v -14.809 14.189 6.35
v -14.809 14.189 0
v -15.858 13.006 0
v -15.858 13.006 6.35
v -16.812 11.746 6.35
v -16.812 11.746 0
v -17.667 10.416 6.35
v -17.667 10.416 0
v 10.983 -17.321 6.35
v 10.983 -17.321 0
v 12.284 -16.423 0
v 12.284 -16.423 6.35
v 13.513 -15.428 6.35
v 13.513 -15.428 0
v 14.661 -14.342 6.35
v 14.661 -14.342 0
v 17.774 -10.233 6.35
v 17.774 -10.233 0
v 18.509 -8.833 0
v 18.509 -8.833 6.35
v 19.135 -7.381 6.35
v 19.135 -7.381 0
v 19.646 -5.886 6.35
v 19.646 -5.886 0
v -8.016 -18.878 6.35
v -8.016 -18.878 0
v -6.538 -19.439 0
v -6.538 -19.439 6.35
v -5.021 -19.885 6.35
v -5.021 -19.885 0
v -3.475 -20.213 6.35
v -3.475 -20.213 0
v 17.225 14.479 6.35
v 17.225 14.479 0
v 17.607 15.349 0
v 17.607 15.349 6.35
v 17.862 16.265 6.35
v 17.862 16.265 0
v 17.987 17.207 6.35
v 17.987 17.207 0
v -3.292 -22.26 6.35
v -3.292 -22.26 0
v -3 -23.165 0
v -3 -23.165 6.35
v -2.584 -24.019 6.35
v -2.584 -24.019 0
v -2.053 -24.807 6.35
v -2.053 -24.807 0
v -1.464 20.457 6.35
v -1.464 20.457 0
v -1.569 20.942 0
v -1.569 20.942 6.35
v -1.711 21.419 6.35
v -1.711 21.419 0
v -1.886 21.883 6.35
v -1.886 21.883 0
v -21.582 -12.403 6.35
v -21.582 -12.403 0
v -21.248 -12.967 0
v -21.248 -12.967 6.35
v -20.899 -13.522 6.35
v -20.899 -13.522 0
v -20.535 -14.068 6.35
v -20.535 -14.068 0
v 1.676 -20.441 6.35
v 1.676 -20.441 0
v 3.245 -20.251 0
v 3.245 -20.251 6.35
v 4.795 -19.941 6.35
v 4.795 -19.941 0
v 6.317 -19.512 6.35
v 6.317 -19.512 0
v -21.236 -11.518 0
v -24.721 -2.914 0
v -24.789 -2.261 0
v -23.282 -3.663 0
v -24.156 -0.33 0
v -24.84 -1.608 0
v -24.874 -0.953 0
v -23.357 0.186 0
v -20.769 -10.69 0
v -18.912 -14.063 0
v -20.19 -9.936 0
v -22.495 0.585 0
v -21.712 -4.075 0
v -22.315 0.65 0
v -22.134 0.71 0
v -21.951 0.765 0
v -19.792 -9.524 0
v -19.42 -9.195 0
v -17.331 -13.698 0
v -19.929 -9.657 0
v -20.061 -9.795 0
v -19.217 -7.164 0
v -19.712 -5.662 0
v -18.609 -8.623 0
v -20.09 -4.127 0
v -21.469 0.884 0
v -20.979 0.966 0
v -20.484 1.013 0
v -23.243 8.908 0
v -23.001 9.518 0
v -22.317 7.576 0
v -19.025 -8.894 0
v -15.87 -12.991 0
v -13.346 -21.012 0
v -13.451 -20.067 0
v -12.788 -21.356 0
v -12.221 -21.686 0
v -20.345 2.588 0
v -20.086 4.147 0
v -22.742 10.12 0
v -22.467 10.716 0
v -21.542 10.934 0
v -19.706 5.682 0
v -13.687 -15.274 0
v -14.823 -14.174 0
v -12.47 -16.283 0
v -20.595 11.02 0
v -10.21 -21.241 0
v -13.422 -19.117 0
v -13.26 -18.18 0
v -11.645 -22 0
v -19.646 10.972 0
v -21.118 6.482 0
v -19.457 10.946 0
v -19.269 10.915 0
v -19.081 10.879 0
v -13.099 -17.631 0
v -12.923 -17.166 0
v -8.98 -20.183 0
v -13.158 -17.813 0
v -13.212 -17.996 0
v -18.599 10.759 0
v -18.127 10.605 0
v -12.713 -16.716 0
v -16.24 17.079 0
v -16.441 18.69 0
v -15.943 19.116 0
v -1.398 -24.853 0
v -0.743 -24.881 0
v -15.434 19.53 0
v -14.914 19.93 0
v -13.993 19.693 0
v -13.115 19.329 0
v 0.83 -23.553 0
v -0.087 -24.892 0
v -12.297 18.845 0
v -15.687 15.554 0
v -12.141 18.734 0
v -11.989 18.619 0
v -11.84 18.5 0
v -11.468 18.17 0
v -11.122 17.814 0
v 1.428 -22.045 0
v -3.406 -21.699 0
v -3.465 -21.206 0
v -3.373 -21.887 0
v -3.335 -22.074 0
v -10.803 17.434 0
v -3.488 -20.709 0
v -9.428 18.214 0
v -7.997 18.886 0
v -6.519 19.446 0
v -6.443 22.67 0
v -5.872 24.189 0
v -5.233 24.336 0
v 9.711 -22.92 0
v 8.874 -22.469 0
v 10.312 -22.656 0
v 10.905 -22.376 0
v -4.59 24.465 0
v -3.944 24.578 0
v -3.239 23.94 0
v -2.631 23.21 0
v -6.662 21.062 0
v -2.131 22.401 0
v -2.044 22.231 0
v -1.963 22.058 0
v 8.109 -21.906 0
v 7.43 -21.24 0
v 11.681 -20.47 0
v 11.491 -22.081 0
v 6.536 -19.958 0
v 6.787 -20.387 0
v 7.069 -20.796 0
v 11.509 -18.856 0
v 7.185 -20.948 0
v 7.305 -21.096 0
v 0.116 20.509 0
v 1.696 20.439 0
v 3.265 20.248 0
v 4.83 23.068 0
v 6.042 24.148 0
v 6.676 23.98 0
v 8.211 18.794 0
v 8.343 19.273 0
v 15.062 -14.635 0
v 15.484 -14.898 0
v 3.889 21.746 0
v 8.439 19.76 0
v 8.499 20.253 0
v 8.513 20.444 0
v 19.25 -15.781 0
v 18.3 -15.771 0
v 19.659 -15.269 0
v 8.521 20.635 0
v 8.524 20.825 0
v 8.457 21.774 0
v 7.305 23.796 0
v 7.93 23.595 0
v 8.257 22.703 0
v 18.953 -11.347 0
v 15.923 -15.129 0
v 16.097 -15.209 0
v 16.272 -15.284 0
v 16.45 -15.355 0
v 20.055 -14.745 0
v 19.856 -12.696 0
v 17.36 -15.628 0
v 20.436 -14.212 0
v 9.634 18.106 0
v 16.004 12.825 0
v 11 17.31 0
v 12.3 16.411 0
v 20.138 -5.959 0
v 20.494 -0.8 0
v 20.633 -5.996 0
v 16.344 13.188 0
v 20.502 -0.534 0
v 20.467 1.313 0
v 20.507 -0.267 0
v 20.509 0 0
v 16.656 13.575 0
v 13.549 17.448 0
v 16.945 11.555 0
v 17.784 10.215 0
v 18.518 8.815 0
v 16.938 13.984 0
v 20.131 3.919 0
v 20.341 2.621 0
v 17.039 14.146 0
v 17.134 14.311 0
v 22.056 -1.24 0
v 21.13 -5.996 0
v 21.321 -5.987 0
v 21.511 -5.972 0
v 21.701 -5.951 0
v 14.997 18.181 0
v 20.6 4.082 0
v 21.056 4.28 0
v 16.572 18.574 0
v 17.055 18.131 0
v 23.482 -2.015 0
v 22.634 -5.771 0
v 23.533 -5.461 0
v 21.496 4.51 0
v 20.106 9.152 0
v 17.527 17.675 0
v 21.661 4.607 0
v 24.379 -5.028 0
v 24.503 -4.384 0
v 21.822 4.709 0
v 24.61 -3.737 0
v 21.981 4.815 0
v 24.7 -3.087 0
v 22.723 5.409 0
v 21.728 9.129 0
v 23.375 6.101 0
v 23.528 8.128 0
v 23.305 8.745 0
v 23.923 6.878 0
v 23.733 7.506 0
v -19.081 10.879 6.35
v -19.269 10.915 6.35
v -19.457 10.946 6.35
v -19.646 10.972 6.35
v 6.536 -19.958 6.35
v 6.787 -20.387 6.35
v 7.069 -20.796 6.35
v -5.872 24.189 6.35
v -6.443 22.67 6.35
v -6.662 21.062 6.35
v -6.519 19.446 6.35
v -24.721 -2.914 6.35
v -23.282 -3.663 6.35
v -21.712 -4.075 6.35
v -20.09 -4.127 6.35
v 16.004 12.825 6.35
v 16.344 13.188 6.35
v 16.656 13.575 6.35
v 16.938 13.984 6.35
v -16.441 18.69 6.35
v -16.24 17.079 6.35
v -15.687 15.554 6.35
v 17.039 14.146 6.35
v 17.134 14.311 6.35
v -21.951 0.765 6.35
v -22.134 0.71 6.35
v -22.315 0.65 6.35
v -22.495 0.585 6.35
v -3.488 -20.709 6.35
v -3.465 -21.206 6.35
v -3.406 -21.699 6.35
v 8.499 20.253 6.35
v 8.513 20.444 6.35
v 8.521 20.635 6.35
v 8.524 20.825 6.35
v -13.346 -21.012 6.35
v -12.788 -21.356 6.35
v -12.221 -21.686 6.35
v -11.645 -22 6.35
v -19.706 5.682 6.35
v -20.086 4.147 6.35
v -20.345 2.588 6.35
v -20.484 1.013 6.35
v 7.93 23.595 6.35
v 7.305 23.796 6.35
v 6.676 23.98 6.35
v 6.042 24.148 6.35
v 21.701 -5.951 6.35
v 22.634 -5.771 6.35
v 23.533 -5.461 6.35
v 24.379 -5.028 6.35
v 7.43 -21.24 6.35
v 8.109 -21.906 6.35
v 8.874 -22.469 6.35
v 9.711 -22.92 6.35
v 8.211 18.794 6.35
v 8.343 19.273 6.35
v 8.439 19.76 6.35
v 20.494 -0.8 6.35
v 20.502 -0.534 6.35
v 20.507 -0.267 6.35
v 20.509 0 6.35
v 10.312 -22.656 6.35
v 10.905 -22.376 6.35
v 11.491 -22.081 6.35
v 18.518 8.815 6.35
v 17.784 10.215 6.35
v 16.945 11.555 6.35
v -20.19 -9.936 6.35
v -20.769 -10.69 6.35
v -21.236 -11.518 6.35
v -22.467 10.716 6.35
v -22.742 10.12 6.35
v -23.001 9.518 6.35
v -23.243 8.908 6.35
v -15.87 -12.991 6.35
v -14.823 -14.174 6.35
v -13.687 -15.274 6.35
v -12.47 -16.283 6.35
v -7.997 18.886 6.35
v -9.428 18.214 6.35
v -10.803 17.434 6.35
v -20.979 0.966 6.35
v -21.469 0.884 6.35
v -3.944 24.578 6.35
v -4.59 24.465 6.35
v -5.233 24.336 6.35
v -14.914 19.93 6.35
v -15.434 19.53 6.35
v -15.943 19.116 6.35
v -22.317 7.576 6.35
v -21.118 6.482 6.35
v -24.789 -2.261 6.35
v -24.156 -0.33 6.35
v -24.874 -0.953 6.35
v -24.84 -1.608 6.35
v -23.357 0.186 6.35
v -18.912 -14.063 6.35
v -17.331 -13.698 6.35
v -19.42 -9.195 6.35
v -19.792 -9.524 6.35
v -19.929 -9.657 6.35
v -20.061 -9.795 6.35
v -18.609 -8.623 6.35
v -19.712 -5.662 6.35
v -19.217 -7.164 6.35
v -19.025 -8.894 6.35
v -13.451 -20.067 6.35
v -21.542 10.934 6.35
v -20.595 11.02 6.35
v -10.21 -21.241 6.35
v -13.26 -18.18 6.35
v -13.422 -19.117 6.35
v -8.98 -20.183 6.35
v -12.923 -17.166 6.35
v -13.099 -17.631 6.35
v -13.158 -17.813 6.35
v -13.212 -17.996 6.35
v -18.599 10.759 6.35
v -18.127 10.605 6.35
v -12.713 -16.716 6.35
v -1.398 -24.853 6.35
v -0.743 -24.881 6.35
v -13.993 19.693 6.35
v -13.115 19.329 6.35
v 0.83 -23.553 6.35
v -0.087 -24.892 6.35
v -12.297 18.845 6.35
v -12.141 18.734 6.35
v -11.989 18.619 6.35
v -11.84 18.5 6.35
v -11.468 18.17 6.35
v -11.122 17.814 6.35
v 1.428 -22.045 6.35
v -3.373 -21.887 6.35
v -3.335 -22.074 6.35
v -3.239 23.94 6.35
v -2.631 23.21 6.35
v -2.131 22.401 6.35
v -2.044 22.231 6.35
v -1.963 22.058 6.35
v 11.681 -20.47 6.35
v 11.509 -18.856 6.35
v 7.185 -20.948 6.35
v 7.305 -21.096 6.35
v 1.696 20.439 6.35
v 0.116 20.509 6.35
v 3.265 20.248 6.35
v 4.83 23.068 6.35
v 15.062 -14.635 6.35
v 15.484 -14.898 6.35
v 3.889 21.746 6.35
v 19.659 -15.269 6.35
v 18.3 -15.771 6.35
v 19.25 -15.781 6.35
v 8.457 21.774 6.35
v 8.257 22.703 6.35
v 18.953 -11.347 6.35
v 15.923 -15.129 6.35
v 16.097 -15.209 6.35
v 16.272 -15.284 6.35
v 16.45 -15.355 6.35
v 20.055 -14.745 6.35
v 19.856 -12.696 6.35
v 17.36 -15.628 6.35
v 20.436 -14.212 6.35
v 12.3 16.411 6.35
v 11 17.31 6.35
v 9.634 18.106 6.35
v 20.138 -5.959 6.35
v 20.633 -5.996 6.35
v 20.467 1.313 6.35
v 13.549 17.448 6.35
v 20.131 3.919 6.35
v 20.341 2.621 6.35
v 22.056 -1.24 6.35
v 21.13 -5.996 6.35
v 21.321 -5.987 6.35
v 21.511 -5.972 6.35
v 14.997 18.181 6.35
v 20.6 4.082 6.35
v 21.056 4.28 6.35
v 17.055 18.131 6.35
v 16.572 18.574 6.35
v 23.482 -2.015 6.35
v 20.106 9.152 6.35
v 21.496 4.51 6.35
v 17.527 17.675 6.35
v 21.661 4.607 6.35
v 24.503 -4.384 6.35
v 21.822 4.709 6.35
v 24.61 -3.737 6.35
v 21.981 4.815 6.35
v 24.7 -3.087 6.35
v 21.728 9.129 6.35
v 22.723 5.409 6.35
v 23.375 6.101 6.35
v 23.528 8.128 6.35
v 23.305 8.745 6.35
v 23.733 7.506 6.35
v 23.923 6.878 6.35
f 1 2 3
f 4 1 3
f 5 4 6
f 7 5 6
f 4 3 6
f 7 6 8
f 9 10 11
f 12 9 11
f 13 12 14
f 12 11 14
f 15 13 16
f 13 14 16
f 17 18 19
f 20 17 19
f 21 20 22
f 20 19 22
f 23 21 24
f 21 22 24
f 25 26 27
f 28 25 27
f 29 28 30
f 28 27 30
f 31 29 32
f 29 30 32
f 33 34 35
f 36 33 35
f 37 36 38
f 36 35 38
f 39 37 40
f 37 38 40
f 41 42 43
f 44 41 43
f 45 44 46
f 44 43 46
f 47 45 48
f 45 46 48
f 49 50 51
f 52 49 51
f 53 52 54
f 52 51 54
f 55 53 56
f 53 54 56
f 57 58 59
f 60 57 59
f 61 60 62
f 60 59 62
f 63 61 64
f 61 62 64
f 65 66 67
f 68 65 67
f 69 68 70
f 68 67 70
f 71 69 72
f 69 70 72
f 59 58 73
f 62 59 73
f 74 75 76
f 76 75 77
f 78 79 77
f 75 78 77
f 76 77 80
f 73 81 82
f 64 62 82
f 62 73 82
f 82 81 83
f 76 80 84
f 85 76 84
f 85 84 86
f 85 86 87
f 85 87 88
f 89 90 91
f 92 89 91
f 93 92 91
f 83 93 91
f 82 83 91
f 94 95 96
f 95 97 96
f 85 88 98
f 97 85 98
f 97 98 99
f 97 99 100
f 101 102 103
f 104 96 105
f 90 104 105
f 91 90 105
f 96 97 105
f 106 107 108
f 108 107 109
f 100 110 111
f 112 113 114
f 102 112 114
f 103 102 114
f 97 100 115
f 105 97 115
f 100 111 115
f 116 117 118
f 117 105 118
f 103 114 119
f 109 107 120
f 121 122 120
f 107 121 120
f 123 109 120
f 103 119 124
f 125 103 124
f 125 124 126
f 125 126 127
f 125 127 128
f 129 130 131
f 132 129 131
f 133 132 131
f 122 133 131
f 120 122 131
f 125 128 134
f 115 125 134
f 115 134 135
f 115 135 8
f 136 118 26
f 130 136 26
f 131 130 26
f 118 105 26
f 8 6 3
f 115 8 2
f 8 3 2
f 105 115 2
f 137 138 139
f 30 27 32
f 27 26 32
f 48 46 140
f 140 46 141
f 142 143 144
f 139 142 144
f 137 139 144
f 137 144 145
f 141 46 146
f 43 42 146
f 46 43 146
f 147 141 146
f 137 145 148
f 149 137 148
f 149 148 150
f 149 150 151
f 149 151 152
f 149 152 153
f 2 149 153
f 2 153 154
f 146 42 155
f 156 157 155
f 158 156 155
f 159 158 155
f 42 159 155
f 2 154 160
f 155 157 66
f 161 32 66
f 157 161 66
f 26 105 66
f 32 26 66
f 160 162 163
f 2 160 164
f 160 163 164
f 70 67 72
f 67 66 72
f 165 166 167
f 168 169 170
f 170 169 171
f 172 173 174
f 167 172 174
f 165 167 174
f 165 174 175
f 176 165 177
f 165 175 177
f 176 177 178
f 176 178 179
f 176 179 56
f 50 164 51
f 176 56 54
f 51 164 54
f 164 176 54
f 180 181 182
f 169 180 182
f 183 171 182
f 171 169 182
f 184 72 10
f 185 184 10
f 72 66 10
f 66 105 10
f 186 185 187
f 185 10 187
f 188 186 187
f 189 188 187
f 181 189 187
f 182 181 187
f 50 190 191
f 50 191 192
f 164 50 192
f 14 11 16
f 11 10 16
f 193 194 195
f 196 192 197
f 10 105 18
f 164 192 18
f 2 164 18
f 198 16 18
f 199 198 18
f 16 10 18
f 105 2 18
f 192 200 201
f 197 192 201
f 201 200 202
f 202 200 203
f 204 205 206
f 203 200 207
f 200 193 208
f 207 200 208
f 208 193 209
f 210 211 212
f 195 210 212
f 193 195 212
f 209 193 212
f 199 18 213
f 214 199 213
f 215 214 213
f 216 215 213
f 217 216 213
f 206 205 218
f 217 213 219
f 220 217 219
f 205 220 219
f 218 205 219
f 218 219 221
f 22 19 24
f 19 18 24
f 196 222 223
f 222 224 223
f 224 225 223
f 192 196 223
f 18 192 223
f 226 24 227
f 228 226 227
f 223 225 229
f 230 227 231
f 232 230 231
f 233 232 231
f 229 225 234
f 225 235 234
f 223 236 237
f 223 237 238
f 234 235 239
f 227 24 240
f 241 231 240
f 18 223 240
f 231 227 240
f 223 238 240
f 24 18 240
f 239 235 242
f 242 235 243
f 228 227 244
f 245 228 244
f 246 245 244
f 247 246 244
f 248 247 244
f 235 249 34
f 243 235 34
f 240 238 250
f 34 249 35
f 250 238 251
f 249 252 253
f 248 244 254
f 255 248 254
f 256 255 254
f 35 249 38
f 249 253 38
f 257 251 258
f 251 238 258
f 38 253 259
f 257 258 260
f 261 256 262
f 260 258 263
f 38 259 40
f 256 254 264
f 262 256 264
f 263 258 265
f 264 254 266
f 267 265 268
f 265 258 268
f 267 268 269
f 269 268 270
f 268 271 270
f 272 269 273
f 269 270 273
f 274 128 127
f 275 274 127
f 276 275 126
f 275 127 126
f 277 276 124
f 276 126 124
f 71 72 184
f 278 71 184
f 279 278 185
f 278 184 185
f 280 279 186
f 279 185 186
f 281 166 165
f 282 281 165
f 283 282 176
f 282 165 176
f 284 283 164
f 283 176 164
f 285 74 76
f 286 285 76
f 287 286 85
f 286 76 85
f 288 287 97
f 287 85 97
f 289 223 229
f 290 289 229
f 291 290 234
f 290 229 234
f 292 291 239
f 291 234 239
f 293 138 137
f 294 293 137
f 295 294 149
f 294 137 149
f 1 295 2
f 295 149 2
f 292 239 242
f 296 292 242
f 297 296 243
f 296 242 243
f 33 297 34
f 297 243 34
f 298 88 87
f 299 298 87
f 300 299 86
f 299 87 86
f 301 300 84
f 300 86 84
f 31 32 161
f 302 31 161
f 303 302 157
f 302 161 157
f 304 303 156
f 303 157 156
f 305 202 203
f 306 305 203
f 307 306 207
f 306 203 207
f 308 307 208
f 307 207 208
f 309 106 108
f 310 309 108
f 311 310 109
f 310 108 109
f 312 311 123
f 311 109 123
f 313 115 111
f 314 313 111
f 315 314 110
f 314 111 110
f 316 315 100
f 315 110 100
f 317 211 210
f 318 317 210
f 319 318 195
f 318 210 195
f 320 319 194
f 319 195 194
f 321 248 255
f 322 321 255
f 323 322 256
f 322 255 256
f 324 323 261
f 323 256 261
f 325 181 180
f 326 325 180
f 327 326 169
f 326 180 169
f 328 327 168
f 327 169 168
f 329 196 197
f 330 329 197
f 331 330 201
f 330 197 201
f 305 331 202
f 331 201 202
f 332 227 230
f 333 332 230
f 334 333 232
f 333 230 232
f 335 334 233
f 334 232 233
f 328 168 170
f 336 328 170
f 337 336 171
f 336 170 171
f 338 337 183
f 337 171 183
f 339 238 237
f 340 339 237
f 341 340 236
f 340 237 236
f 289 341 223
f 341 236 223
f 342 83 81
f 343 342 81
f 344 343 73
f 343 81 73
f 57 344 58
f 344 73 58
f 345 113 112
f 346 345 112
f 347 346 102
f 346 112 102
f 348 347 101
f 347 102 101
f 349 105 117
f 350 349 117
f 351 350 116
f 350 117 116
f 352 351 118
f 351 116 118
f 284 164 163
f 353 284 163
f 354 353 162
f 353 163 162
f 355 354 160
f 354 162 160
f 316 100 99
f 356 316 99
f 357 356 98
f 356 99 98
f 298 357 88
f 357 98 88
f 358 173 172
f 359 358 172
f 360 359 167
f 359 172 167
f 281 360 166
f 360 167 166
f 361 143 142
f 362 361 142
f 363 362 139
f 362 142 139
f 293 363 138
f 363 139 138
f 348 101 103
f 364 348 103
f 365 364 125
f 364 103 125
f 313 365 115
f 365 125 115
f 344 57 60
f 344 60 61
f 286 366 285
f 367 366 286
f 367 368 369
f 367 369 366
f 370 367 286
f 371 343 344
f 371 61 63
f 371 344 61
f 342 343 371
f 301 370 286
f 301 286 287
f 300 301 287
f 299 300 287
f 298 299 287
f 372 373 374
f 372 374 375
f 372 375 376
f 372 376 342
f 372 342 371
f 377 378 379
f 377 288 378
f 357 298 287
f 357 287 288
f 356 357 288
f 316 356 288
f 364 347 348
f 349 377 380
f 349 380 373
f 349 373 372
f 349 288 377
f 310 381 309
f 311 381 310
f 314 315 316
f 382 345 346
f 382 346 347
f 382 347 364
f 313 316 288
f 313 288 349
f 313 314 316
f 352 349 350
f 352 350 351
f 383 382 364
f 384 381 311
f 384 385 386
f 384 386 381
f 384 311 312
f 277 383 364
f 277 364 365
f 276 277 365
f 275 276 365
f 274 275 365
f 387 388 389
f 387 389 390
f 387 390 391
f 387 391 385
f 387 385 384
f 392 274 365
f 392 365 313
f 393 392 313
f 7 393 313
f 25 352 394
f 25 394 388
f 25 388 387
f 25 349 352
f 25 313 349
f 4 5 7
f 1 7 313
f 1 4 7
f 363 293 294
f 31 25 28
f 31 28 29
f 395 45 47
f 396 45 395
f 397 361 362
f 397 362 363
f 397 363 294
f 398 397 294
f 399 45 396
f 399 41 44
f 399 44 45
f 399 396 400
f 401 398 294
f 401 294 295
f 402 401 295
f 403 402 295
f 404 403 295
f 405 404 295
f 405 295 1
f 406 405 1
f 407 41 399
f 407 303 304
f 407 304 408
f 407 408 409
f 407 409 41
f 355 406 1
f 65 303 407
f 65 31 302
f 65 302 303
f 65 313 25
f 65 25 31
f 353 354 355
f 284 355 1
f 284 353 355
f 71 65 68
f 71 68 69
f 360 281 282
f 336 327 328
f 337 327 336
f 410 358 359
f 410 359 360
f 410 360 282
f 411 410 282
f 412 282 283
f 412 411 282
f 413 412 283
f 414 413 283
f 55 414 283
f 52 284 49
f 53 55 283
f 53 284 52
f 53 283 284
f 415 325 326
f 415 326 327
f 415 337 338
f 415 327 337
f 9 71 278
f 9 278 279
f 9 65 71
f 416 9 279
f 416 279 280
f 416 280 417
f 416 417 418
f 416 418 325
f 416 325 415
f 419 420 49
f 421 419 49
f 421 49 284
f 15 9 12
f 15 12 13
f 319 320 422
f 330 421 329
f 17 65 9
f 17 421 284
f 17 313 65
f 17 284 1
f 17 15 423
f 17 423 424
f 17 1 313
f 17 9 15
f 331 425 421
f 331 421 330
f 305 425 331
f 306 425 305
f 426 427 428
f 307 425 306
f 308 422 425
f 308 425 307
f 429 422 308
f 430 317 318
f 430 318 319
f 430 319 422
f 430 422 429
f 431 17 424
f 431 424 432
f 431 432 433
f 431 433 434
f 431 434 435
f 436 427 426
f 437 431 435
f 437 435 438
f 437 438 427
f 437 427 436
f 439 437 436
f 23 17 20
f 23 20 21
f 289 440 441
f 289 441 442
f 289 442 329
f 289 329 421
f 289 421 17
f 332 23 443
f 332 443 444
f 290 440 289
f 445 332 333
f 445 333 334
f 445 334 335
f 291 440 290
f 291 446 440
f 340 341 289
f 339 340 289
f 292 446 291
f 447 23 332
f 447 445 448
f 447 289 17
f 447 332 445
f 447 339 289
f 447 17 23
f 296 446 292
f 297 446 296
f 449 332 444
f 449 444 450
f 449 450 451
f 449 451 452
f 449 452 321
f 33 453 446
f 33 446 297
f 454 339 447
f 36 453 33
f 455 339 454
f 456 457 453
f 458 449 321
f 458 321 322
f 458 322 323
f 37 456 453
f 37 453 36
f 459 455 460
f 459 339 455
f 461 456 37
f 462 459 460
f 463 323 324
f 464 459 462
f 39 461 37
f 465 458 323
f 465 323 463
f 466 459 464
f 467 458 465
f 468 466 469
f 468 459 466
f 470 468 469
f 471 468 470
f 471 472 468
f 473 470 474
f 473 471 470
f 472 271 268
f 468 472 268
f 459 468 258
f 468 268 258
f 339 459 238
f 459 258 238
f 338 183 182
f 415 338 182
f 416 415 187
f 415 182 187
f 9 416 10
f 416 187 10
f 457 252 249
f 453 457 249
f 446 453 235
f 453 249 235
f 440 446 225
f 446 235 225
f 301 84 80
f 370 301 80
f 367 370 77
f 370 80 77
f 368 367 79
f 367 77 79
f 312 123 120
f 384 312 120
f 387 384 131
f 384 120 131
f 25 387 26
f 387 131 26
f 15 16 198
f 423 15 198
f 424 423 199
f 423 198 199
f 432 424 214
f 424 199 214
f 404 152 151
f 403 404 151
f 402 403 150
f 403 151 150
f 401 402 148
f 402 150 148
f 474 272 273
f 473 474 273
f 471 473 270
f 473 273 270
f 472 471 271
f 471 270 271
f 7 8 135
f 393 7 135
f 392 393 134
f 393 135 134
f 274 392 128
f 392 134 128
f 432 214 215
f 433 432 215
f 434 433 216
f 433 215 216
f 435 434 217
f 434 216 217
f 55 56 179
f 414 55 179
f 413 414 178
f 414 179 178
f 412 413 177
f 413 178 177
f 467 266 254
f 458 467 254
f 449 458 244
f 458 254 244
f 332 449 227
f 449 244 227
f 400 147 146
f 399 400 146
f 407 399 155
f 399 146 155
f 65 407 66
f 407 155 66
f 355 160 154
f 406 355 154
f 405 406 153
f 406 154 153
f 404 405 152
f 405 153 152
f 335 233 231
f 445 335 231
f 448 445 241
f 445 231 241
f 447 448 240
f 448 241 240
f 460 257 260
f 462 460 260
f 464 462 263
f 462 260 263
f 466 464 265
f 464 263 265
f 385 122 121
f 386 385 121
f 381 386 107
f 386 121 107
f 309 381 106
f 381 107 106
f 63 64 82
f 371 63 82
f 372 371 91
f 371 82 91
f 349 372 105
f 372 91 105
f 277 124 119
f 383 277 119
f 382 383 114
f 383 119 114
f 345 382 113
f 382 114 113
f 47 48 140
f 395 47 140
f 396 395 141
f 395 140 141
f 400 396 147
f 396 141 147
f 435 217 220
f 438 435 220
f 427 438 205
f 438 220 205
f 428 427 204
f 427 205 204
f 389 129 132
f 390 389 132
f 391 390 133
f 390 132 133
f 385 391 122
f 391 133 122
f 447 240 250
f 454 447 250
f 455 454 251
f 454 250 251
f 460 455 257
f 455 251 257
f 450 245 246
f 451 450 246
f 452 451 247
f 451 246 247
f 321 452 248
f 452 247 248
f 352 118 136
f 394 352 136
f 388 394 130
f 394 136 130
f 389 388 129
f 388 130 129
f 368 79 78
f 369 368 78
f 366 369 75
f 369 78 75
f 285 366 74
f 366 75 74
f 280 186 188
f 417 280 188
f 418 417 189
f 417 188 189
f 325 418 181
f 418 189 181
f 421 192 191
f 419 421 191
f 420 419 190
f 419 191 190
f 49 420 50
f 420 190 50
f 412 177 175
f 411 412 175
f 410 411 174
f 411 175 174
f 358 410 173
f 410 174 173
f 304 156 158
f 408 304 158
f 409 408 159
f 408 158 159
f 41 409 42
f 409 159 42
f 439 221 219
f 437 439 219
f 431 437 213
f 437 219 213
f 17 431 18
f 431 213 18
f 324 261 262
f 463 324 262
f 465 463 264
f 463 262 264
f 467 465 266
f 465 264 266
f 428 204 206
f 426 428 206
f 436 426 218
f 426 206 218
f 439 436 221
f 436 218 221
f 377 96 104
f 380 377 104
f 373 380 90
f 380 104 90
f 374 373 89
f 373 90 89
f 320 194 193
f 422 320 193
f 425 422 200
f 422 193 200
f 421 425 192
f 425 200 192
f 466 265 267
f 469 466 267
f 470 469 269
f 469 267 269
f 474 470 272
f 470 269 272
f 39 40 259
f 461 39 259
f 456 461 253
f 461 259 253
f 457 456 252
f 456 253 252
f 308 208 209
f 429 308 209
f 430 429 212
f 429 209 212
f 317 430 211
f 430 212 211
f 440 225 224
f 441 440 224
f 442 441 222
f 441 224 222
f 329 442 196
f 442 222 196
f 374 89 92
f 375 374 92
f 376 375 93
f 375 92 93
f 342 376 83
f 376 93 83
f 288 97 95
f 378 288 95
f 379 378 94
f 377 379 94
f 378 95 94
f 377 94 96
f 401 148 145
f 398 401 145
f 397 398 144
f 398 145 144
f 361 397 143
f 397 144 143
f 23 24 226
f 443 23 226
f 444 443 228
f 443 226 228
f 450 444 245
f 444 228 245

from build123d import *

# Parameters (mm, degrees)
F1_DEPTH = 6.35
F2_COUNT = 13


with BuildPart() as f1:
    # F0 (on Top) → F1 (new body)
    with BuildSketch(Plane.XY):
        with BuildLine():
            ThreePointArc((7.9296197565, 23.5951858335), (6.9911317973, 23.8900761864), (6.0417249702, 24.1476546146))
            ThreePointArc((6.0417249702, 24.1476546146), (4.3226425573, 22.4330749308), (3.2648662162, 20.2476374354))
            ThreePointArc((3.2648662162, 20.2476374354), (5.7837443287, 19.6767495961), (8.2108987358, 18.7938105523))
            ThreePointArc((8.2108987358, 18.7938105523), (8.3954934616, 19.5156536929), (8.4994507341, 20.2534379554))
            ThreePointArc((8.4994507341, 20.2534379554), (8.5176465567, 20.5391701676), (8.5237154667, 20.8254168329))
            ThreePointArc((8.5237154667, 20.8254168329), (8.373521449, 22.2418004346), (7.9296197565, 23.5951858335))
        make_face()
        with BuildLine():
            ThreePointArc((4.0264902572, 14.4598933509), (-1.7431476836, 15.057566034), (-4.9211585336, 19.9100068261))
            ThreePointArc((-4.9211585336, 19.9100068261), (-12.6431262329, -16.1486077476), (20.5091729021, 0))
            ThreePointArc((20.5091729021, 0), (19.2415803806, 7.0984334598), (15.5954927821, 13.3194135761))
            ThreePointArc((15.5954927821, 13.3194135761), (9.5256046991, 10.9946956396), (4.0264902572, 14.4598933509))
        make_face()
        with BuildLine():
            ThreePointArc((3.2648662162, 20.2476374354), (-0.8451772993, 20.4917507417), (-4.9211585336, 19.9100068261))
            ThreePointArc((-4.9211585336, 19.9100068261), (-1.7431476836, 15.057566034), (4.0264902572, 14.4598933509))
            ThreePointArc((4.0264902572, 14.4598933509), (3.0384725246, 17.2738616412), (3.2648662162, 20.2476374354))
        make_face()
        with BuildLine():
            ThreePointArc((4.0264902572, 14.4598933509), (9.5256046991, 10.9946956396), (15.5954927821, 13.3194135761))
            ThreePointArc((15.5954927821, 13.3194135761), (12.2138579016, 16.4756744411), (8.2108987358, 18.7938105523))
            ThreePointArc((8.2108987358, 18.7938105523), (6.6287005247, 16.1344397874), (4.0264902572, 14.4598933509))
        make_face()
        with BuildLine():
            ThreePointArc((8.2108987358, 18.7938105523), (5.7837443287, 19.6767495961), (3.2648662162, 20.2476374354))
            ThreePointArc((3.2648662162, 20.2476374354), (3.0384725246, 17.2738616412), (4.0264902572, 14.4598933509))
            ThreePointArc((4.0264902572, 14.4598933509), (6.6287005247, 16.1344397874), (8.2108987358, 18.7938105523))
        make_face()
    extrude(amount=F1_DEPTH)

    # F2: F1 ×13 about axis
    f2_axis = Axis((0, 0, 6.35), (0, 0, 1))


with BuildPart() as f1_1:
    add(f1.part)
    for i in range(1, F2_COUNT):
        add(f1.part.rotate(f2_axis, i * 360 / F2_COUNT))


solid = f1_1.part
